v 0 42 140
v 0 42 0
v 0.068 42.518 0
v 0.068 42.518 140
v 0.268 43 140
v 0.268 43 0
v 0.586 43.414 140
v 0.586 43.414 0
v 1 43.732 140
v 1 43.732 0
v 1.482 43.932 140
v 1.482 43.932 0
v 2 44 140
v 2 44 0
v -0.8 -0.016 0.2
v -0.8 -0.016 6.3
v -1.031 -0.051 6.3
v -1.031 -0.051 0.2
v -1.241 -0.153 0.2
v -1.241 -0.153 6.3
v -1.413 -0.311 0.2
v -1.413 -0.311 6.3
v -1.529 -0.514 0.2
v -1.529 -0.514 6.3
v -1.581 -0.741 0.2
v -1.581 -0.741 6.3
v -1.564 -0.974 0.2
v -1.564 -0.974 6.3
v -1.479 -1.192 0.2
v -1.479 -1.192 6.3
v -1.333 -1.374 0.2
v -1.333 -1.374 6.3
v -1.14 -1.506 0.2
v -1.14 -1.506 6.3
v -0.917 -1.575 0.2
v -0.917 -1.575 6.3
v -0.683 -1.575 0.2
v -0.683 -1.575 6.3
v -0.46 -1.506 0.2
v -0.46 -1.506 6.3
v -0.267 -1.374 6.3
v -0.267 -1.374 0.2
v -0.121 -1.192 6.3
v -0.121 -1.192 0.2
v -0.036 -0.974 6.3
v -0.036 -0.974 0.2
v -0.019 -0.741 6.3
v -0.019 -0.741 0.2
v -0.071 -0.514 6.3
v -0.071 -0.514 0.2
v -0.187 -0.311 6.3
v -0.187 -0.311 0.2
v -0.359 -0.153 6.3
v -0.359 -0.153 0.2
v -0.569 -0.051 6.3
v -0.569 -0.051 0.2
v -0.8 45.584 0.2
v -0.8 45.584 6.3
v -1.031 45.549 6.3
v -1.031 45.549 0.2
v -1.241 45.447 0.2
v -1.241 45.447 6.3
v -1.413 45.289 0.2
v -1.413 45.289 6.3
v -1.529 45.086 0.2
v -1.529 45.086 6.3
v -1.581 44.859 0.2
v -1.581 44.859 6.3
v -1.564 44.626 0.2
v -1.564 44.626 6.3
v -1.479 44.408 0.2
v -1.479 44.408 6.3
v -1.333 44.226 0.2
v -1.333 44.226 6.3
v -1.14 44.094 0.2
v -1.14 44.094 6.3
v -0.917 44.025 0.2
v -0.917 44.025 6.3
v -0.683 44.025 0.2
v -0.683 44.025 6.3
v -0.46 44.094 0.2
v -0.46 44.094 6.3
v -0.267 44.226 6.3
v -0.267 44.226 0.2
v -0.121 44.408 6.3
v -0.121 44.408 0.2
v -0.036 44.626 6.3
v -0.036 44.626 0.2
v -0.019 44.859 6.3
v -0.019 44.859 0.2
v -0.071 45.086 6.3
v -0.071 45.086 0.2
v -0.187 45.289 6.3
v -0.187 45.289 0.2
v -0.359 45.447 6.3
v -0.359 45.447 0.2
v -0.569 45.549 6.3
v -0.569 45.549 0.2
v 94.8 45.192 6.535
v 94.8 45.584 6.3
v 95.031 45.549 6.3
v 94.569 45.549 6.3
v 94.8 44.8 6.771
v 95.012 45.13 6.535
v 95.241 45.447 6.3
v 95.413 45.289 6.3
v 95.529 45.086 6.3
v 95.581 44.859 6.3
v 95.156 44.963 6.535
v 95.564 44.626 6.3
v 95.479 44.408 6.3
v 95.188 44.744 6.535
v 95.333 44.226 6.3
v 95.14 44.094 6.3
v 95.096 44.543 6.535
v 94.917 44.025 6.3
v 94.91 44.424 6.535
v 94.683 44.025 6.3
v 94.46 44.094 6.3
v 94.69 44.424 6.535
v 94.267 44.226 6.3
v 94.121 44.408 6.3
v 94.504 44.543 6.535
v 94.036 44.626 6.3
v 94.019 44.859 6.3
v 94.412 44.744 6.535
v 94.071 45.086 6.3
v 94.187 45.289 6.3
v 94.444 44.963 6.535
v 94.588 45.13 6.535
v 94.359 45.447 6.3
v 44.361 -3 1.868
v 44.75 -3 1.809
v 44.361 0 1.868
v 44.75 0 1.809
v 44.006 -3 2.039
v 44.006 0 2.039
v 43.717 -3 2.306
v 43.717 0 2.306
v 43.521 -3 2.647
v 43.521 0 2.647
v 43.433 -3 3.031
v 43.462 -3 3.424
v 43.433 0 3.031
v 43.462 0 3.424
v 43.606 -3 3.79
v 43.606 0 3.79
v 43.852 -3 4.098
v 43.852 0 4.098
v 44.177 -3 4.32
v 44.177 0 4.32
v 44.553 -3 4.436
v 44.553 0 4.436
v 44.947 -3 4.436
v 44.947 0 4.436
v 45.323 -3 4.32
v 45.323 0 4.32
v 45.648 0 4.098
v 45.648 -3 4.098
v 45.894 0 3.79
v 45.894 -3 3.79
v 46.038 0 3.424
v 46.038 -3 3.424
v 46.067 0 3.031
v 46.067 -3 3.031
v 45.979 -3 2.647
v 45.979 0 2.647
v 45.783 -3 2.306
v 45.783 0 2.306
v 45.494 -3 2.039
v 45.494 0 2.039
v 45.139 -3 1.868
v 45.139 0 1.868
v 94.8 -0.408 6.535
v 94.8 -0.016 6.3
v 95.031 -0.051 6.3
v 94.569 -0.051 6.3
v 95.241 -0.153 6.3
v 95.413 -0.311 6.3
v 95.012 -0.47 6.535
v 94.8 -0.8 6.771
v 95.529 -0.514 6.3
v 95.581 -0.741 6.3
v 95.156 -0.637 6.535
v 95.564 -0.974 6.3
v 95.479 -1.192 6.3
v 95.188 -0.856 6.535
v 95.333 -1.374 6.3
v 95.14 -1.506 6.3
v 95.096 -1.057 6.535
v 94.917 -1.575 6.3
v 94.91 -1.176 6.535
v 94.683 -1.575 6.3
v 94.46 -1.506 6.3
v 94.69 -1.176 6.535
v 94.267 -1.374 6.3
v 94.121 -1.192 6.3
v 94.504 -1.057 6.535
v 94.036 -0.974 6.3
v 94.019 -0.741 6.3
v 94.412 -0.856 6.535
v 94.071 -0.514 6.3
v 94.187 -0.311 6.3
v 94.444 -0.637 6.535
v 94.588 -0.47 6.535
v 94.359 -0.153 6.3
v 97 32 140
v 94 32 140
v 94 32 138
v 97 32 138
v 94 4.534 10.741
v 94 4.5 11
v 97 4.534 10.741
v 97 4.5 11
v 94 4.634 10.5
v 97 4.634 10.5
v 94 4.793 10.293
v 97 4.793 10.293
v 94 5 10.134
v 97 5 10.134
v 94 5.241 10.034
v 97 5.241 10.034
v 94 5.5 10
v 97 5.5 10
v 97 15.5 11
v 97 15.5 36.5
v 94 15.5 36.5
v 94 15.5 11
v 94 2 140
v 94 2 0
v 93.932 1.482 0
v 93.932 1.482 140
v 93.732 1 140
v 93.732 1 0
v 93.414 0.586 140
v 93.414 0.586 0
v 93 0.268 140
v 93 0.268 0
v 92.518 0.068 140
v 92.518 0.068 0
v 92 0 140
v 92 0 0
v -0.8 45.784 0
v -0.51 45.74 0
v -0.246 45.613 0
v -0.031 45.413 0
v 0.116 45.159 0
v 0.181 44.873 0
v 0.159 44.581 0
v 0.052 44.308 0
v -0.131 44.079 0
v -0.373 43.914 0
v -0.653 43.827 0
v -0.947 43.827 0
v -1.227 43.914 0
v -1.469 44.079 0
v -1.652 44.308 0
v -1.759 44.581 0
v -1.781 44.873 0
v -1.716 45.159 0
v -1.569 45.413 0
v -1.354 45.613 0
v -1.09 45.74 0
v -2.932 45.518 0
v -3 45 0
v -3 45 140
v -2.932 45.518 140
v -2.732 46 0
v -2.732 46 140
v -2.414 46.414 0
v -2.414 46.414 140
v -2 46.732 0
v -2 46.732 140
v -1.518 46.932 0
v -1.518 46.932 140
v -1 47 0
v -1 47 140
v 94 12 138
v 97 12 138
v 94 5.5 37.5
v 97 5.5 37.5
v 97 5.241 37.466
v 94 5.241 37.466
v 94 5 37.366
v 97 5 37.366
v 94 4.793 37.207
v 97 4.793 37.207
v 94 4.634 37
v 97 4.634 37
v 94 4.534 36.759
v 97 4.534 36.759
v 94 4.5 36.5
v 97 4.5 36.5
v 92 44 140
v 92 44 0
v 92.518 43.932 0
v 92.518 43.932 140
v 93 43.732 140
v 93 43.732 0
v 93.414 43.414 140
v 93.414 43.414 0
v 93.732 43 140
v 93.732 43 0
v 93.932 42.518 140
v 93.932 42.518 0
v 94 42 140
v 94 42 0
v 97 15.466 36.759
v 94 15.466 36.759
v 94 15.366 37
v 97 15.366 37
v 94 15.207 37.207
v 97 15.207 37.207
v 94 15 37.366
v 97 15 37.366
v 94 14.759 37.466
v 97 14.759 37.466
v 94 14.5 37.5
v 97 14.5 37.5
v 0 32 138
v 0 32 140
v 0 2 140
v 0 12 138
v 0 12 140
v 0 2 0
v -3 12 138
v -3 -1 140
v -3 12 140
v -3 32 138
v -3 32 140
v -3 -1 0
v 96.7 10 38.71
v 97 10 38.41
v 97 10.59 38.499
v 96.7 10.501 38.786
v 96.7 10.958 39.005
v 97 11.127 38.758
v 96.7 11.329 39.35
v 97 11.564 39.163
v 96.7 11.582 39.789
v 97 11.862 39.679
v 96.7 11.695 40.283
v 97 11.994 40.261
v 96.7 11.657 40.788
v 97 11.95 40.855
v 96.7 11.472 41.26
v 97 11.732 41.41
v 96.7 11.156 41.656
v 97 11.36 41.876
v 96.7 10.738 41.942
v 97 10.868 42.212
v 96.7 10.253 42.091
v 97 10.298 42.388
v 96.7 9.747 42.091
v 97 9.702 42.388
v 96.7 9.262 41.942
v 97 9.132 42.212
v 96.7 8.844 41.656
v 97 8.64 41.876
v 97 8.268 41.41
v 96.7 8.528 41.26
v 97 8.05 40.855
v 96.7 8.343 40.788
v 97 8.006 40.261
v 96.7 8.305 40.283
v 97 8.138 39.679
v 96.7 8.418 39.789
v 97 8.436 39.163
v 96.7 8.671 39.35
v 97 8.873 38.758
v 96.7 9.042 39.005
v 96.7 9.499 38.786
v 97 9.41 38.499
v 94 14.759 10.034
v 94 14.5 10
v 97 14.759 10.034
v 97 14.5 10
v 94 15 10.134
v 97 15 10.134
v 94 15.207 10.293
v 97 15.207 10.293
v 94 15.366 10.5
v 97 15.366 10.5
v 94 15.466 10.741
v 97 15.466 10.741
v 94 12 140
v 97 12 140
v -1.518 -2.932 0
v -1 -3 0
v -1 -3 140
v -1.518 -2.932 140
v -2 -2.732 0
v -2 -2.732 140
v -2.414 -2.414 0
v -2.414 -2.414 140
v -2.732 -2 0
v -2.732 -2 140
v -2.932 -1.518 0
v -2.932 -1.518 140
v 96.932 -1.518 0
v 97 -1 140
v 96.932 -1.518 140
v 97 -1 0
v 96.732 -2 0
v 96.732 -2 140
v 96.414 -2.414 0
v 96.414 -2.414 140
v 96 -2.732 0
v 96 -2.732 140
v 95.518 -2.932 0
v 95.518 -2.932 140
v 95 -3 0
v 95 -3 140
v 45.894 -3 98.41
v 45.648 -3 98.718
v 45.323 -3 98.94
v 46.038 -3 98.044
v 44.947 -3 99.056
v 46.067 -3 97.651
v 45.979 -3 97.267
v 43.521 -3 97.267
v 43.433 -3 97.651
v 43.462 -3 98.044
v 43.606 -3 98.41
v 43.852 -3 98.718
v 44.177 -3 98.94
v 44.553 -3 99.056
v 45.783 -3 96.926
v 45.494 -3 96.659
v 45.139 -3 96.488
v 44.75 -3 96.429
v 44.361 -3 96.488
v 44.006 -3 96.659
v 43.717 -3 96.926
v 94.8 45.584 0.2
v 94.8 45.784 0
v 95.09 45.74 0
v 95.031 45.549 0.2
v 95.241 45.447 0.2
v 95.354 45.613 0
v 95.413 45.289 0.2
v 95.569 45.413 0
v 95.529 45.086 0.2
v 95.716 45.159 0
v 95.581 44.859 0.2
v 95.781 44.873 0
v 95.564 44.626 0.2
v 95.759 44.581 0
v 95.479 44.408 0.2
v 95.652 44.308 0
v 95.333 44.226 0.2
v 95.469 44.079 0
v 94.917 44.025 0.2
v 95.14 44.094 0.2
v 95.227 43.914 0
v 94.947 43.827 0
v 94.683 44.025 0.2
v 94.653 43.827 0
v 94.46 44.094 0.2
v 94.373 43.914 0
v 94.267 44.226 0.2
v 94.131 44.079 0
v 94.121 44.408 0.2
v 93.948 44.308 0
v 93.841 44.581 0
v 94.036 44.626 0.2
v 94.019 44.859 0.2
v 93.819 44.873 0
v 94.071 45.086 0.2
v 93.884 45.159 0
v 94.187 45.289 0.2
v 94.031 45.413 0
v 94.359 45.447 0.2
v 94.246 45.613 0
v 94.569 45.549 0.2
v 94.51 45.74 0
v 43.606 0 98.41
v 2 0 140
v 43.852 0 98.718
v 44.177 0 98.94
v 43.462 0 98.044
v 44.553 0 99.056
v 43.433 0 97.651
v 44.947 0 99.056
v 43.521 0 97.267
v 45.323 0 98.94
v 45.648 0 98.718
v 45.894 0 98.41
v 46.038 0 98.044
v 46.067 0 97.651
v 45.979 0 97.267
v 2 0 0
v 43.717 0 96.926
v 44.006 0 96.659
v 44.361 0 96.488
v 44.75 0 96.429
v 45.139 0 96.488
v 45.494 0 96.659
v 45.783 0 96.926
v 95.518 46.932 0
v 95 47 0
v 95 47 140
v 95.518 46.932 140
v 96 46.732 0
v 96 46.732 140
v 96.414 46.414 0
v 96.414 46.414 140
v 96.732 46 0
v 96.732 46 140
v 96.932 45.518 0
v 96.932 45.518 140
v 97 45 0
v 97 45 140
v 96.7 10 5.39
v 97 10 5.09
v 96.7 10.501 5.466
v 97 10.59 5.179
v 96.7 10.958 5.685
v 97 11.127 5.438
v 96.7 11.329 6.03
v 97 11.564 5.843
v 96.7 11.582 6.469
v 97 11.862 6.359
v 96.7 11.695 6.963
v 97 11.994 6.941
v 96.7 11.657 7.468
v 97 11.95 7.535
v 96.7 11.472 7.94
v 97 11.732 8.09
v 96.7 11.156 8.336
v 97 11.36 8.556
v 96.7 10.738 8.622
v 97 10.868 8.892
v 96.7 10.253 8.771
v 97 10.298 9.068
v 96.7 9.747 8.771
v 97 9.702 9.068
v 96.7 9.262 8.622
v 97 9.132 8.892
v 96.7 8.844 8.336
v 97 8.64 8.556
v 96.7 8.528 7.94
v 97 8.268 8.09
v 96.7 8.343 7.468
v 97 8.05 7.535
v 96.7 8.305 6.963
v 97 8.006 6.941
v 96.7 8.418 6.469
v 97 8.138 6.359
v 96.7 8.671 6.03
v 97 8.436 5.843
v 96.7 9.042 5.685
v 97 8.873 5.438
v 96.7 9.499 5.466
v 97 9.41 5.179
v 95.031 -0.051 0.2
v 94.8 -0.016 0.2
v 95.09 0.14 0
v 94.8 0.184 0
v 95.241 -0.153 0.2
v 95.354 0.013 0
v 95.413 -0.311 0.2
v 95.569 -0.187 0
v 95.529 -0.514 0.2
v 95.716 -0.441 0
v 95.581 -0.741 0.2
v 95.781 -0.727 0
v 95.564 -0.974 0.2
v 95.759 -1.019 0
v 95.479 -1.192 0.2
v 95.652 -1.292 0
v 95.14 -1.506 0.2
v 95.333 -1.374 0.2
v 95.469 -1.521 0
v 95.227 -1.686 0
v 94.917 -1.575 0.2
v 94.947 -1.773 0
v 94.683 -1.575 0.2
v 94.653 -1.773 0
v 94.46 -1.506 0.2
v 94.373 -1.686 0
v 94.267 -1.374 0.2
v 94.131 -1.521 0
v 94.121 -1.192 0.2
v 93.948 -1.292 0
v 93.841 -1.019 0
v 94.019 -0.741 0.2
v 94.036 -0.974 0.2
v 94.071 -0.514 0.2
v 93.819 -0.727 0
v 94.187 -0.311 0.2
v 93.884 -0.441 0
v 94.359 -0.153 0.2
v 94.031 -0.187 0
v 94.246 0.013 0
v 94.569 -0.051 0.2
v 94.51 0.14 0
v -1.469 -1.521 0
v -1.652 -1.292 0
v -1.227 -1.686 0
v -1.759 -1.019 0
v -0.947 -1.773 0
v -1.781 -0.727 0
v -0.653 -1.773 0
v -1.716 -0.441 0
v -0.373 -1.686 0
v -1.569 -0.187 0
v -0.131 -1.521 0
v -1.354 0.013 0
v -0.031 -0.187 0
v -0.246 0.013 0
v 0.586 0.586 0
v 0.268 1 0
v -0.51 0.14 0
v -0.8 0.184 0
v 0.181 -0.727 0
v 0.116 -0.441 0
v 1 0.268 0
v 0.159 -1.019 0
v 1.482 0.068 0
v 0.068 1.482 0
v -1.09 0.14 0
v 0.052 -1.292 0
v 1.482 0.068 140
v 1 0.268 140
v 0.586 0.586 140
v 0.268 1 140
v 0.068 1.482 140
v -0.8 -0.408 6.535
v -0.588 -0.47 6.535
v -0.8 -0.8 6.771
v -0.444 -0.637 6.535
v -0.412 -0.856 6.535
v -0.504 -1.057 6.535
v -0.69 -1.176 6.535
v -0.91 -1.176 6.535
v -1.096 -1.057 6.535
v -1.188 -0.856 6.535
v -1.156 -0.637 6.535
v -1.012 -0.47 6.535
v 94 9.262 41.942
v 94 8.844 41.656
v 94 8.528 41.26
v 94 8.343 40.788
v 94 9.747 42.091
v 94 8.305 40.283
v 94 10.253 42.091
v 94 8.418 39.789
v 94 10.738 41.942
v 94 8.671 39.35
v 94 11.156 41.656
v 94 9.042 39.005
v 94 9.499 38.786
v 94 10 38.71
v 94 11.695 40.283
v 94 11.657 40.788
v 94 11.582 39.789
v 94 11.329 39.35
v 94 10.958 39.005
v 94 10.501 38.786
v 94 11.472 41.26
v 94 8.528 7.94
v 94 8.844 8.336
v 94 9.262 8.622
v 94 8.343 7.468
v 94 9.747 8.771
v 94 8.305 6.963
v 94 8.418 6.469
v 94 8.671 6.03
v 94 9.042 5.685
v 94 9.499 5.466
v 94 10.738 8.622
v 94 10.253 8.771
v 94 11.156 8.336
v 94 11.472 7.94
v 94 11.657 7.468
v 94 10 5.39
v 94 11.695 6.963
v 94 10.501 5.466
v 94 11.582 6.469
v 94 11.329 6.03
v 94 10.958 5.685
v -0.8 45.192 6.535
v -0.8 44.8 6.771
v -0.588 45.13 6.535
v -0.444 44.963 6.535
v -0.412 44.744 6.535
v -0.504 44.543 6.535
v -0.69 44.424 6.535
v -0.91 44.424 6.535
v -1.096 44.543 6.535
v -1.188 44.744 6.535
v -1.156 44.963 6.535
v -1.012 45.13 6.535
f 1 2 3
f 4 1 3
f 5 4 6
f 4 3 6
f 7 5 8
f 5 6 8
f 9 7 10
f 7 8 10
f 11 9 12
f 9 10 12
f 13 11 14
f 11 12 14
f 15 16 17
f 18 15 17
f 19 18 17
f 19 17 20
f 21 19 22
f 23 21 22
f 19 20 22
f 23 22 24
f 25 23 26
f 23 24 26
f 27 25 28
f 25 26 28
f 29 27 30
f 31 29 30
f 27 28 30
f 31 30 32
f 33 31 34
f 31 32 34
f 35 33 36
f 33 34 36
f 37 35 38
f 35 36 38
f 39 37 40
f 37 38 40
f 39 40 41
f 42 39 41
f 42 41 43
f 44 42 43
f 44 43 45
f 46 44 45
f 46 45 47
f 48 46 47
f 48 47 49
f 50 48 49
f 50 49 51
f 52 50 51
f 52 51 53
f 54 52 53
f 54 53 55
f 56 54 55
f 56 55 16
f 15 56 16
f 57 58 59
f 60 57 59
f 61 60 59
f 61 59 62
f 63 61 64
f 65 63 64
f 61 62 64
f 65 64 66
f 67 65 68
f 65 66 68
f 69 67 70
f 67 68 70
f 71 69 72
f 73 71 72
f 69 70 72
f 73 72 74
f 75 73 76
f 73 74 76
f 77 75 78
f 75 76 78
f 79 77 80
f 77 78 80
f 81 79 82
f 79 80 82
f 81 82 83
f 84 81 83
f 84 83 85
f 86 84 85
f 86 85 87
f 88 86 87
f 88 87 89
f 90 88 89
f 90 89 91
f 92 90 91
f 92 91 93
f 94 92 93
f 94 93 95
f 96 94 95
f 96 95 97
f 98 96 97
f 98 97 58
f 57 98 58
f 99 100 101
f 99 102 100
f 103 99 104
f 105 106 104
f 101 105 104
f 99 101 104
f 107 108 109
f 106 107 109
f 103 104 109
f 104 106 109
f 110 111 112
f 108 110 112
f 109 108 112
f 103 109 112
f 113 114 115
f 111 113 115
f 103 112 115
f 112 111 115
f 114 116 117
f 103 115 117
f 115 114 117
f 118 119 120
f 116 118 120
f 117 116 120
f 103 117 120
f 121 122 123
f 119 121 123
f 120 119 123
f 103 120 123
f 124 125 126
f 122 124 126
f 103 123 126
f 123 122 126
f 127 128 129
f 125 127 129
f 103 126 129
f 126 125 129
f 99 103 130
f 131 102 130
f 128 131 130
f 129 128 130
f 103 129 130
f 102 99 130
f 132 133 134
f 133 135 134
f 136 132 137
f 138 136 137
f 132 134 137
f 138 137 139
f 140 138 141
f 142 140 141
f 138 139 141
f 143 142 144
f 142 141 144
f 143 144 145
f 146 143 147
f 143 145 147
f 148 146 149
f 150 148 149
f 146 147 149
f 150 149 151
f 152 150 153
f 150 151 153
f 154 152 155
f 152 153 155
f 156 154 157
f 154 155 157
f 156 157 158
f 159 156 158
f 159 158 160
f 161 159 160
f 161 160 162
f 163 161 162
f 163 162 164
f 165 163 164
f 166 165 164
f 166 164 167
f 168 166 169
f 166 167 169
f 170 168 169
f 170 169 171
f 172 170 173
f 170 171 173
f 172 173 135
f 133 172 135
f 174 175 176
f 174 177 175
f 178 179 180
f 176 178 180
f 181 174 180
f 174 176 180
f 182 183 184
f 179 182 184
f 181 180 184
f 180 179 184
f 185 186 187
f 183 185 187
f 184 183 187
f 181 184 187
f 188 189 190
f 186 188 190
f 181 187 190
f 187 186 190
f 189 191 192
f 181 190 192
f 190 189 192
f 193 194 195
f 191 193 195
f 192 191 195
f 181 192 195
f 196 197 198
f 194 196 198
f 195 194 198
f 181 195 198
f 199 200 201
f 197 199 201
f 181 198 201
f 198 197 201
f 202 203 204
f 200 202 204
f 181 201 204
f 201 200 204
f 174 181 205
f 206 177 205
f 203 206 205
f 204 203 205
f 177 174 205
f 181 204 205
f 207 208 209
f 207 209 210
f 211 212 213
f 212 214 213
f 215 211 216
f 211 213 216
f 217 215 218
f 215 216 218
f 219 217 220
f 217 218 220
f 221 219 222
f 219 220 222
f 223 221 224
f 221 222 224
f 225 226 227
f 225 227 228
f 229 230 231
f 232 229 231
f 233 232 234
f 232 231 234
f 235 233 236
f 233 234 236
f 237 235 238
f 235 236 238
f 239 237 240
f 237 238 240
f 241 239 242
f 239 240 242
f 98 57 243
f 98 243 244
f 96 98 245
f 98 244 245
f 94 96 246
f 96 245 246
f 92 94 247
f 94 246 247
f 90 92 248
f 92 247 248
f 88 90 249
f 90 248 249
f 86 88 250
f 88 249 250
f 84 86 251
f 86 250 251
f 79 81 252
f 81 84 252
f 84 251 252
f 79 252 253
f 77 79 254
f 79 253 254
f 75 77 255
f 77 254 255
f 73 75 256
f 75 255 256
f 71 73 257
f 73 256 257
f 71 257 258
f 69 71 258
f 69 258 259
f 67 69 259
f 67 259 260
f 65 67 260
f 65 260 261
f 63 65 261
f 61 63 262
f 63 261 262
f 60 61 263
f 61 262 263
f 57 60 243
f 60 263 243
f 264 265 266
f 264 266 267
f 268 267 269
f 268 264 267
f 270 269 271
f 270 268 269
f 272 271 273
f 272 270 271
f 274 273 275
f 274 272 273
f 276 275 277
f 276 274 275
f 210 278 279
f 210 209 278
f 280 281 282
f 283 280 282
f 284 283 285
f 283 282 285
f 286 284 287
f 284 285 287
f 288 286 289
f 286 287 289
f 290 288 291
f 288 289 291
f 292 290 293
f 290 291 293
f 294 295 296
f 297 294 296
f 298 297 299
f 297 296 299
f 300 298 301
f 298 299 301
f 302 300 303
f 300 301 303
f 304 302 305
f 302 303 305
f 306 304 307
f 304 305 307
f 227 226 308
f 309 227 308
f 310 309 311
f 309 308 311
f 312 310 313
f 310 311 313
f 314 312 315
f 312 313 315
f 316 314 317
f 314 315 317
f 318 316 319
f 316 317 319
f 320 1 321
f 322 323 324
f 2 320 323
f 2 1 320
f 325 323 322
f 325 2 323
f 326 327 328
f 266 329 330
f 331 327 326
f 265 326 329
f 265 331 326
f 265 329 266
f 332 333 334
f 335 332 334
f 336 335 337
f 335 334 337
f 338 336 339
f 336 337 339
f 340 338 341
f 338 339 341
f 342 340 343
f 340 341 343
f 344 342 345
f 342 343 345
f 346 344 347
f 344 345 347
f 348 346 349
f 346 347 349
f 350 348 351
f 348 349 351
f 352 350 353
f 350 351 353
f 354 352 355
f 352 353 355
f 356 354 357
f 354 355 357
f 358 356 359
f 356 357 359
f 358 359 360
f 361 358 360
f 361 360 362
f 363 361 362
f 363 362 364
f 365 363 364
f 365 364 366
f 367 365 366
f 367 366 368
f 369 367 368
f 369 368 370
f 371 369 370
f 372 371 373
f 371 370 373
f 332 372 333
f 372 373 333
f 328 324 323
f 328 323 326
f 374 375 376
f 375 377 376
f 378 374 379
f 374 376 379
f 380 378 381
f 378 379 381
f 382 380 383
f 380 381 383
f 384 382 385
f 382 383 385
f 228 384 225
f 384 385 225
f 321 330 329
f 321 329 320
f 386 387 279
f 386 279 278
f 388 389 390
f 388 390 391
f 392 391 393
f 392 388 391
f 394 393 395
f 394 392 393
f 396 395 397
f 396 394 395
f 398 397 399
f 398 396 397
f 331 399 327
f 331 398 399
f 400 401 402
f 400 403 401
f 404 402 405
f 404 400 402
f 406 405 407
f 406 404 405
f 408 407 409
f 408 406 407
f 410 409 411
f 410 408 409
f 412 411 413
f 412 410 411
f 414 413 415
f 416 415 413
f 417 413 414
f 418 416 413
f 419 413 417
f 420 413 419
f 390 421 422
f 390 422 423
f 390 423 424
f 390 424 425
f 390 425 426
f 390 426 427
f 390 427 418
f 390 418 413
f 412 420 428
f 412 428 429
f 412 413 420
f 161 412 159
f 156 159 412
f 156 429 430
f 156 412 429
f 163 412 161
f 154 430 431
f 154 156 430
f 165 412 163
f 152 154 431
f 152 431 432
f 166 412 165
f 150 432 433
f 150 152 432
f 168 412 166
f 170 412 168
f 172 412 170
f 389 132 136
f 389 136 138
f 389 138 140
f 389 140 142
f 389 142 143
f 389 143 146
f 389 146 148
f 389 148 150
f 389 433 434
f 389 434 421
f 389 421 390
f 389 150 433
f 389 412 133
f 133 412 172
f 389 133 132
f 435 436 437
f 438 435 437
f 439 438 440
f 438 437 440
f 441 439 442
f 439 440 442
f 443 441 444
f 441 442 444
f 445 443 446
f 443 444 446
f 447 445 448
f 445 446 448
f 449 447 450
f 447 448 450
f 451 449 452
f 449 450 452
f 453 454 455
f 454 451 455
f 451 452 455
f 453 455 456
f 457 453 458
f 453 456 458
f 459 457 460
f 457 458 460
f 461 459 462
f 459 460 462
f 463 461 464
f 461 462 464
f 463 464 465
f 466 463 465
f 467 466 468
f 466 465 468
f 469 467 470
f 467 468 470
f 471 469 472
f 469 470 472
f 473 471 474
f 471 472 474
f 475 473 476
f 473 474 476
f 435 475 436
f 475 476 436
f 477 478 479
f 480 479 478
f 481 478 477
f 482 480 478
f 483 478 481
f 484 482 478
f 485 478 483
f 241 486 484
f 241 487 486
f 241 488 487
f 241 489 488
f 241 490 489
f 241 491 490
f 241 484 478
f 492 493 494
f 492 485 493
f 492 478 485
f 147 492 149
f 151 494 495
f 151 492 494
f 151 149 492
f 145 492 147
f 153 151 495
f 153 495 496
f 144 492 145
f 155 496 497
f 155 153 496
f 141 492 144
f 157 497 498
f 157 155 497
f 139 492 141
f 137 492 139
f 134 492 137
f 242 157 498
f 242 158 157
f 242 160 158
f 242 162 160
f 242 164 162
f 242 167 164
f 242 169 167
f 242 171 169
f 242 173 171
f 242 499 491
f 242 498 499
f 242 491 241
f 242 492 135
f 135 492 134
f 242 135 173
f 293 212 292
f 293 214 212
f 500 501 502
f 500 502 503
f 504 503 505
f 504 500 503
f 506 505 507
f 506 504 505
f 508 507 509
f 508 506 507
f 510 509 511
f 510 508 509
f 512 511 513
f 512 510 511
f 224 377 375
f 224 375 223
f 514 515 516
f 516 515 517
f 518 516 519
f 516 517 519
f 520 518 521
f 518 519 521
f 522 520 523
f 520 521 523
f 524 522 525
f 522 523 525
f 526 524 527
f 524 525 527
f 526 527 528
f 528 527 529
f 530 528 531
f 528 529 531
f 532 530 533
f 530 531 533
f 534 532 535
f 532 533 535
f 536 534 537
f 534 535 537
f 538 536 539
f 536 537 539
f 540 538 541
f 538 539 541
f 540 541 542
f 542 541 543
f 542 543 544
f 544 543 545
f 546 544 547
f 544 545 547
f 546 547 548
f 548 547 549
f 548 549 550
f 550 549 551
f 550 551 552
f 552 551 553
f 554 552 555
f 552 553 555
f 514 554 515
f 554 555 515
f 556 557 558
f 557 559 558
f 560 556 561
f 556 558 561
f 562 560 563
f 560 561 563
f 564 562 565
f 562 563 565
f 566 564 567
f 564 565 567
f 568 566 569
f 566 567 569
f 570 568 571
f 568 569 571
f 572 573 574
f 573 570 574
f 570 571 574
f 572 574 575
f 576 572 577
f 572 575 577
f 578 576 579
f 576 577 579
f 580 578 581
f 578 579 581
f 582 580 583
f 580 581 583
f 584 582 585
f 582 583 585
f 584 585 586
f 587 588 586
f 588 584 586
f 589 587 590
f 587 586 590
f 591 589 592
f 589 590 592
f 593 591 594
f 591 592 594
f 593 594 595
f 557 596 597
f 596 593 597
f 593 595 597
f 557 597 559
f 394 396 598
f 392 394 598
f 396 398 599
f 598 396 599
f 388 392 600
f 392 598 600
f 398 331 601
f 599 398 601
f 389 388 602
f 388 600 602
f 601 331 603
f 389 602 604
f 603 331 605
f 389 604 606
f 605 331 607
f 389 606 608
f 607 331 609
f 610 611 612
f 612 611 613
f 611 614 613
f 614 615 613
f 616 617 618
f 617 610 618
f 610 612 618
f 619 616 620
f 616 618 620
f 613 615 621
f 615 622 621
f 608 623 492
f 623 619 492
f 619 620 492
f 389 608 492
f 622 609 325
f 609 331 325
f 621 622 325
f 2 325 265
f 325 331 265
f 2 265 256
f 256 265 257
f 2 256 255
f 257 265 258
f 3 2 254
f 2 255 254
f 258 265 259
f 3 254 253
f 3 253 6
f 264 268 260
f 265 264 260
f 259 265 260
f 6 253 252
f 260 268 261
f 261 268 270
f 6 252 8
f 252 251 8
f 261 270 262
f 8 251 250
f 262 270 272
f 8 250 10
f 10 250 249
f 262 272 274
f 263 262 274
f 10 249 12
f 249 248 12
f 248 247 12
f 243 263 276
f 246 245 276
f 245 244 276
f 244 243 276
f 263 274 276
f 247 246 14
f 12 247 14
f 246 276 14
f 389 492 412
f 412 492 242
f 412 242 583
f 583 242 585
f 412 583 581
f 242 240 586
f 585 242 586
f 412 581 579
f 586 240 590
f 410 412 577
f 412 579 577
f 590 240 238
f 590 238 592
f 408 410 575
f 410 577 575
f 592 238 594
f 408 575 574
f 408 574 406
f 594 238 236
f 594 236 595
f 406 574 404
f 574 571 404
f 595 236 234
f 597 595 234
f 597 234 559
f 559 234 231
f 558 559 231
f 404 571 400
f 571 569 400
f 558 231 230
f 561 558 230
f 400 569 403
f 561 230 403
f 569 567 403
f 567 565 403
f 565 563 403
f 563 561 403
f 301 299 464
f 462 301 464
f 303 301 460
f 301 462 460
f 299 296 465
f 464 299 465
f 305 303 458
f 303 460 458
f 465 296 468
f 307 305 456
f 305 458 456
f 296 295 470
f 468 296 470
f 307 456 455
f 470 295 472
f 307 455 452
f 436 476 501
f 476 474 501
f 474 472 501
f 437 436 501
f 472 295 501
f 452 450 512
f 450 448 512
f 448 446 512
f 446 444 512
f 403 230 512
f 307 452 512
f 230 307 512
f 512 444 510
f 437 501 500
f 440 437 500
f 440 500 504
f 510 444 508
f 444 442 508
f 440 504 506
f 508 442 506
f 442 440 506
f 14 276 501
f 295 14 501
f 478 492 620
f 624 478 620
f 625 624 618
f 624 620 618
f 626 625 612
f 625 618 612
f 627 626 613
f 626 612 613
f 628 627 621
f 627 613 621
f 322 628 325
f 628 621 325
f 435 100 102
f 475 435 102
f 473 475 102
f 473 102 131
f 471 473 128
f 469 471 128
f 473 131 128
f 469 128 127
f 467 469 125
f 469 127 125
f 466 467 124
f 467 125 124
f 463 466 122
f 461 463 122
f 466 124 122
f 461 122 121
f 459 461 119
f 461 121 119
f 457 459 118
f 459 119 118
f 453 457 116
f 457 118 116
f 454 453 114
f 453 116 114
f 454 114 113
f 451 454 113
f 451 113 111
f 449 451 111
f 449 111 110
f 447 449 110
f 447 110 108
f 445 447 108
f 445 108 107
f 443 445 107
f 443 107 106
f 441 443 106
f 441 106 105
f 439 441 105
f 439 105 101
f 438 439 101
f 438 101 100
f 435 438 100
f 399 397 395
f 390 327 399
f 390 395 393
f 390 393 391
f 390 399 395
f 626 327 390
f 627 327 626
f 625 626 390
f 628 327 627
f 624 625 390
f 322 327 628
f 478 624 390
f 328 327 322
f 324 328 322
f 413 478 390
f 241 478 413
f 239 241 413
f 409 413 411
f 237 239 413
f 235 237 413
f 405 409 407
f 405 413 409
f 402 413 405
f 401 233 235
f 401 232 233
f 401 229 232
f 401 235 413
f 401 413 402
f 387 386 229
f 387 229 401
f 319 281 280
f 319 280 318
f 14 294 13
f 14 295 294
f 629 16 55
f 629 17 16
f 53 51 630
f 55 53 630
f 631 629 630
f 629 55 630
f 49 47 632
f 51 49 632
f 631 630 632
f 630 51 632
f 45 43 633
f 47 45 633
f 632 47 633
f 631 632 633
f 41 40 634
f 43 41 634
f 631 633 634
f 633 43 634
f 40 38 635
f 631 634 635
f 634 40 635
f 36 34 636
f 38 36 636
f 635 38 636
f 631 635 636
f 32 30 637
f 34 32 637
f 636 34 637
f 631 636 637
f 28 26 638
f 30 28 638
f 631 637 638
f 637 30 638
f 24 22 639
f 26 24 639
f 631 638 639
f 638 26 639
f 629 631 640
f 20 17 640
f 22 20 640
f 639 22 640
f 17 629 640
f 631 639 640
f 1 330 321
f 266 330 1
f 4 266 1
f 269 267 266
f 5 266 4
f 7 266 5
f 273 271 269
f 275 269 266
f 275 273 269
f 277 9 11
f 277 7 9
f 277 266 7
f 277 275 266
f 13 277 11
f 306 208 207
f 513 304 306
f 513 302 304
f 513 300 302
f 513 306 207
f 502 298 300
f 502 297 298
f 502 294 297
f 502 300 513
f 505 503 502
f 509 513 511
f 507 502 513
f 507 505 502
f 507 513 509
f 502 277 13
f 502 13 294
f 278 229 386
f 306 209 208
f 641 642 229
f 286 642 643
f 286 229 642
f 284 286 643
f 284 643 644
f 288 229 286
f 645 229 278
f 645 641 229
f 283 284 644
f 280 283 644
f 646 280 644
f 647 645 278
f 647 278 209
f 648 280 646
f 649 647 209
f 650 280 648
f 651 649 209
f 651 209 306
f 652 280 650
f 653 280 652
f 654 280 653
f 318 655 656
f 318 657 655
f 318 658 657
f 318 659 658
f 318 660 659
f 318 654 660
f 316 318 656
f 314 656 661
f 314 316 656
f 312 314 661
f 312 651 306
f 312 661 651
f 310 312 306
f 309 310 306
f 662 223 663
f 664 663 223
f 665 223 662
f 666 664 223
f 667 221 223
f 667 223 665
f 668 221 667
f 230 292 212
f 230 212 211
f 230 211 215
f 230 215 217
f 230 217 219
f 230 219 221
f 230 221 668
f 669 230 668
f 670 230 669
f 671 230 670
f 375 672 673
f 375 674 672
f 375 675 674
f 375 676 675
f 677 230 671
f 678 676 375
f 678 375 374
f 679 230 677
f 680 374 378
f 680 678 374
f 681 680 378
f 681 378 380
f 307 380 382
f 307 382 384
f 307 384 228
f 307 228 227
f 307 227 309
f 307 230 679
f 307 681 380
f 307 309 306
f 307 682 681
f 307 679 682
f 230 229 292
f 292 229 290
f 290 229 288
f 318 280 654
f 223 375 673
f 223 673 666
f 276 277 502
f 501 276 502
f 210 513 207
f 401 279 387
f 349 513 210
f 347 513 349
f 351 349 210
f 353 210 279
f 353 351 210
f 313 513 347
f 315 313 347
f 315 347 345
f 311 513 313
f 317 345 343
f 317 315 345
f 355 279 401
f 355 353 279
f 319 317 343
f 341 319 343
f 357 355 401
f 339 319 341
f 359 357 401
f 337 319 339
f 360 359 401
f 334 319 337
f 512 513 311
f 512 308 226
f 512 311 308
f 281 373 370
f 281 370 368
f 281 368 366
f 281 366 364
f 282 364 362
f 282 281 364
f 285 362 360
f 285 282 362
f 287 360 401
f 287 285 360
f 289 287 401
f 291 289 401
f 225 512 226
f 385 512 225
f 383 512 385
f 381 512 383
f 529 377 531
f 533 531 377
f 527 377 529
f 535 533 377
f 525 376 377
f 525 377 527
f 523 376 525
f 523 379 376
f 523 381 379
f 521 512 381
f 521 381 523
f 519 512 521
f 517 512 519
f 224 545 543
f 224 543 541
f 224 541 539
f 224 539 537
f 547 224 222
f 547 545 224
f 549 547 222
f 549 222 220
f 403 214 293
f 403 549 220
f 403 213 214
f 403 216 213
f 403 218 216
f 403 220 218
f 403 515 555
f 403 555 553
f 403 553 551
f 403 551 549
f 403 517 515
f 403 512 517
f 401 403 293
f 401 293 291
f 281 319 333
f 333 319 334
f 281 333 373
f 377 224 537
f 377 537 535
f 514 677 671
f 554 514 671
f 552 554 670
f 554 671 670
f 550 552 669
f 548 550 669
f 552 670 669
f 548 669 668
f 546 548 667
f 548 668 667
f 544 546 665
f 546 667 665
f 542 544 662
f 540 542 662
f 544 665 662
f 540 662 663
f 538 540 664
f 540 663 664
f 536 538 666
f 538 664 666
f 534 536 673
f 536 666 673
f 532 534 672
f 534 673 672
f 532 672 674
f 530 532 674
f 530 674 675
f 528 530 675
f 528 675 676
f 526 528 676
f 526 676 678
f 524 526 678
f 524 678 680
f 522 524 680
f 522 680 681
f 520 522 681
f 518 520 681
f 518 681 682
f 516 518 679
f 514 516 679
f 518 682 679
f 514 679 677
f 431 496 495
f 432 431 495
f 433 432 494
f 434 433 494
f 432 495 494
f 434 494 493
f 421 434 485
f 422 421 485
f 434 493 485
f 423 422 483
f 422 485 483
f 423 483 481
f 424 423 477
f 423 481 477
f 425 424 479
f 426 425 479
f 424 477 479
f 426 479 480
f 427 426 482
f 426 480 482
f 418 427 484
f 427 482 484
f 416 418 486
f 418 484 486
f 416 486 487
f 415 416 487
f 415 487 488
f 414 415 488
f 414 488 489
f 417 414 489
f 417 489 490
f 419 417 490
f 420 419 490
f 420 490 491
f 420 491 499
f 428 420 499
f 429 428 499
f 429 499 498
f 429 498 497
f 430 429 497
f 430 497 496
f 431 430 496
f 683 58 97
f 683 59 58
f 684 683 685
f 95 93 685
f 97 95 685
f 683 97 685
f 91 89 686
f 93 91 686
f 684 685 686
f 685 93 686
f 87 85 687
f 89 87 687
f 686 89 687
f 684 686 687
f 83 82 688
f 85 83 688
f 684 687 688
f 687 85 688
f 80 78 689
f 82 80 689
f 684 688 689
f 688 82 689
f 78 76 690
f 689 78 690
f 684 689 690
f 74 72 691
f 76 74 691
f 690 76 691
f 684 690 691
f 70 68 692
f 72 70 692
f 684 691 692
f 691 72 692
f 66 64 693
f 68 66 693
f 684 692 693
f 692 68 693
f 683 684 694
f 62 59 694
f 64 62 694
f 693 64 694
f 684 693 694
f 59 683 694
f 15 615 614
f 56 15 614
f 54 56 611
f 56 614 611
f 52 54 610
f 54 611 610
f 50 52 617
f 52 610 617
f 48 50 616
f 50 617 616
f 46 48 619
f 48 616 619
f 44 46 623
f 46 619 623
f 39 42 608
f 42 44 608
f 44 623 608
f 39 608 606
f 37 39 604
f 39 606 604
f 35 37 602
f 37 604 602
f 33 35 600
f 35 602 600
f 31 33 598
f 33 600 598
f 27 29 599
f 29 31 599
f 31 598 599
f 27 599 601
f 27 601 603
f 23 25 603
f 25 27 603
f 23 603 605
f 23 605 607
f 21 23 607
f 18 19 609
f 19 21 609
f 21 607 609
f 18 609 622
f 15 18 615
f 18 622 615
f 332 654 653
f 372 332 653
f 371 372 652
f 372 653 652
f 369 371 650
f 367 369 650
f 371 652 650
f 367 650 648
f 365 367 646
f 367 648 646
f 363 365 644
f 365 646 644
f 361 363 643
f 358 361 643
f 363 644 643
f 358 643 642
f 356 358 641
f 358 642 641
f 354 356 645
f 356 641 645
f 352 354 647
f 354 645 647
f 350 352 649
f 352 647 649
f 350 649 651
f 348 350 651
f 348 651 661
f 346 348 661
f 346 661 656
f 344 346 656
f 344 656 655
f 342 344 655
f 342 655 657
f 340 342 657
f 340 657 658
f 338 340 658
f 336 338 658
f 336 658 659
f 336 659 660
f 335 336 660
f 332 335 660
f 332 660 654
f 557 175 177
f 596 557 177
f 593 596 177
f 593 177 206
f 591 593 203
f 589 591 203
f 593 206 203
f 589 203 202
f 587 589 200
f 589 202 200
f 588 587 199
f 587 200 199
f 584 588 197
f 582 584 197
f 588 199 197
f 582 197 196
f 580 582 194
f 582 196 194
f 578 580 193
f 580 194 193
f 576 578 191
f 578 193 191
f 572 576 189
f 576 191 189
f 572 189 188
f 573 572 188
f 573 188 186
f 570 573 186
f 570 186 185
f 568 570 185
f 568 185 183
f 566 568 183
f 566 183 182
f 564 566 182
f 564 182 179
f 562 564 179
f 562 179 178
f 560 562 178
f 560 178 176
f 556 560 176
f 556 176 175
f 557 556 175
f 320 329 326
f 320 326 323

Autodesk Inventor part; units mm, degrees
ref_plane "YZ Plane" through (0, 0, 0) normal (1, 0, 0) x (0, 1, 0)
ref_plane "XZ Plane" through (0, 0, 0) normal (0, 1, 0) x (-1, 0, 0)
ref_plane "XY Plane" through (0, 0, 0) normal (0, 0, 1) x (1, 0, 0)
sketch "Sketch1" plane through (0, 0, 0) normal (0, 0, 1) x (1, 0, 0)
  line L0 (2, 0) -> (92, 0)
  line L1 (94, 2) -> (94, 42)
  line L2 (92, 44) -> (2, 44)
  line L3 (0, 42) -> (0, 2)
  line L4 (-1, 47) -> (95, 47)
  line L5 (97, 45) -> (97, -1)
  line L6 (95, -3) -> (-1, -3)
  line L7 (-3, -1) -> (-3, 45)
  arc A0 (2, 44) -> (0, 42) centre (2, 42) ccw
  arc A1 (0, 2) -> (2, 0) centre (2, 2) ccw
  arc A2 (92, 0) -> (94, 2) centre (92, 2) ccw
  arc A3 (94, 42) -> (92, 44) centre (92, 42) ccw
  arc A4 (-3, -1) -> (-1, -3) centre (-1, -1) ccw
  arc A5 (-1, 47) -> (-3, 45) centre (-1, 45) ccw
  arc A6 (97, 45) -> (95, 47) centre (95, 45) ccw
  arc A7 (95, -3) -> (97, -1) centre (95, -1) ccw
  point P0 (0, 0)
  point P1 (94, 44)
  point P2 (94, 0)
  point P3 (0, 44)
  point P4 (97, -3)
  point P5 (97, 47)
  point P6 (-3, -3)
  dimension "d0" = 94
  dimension "d1" = 44
  dimension "d2" = 100
  dimension "d3" = 50
  dimension "d4" = 3
  dimension "d5" = 3
  dimension "d6" = 2
  dimension "d9" = 2
extrude "Extrusion1" add sketch "Sketch1" along normal blind 140
sketch "Sketch2" plane through (0, 0, 140) normal (0, 0, 1) x (1, 0, 0)
  line L0 (-3, 45) -> (-3, -1) projected
  line L1 (97, -1) -> (97, 45) projected
  line L2 (-3, 32) -> (97, 32)
  line L3 (97, 32) -> (97, 12)
  line L4 (97, 12) -> (-3, 12)
  line L5 (-3, 12) -> (-3, 32)
  line L6 (-1, -3) -> (95, -3) projected
  line L7 (95, 47) -> (-1, 47) projected
  point P0 (0, 0)
  point P1 (-3, 12)
  dimension "d10" = 20
  dimension "d11" = 15
  dimension "d12" = 50
extrude "Extrusion2" cut sketch "Sketch2" against normal blind 2
sketch "Sketch3" plane through (97, -1, 0) normal (1, 0, 0) x (0, 0, -1)
  line L0 (-11, 5.5) -> (-36.5, 5.5)
  line L1 (-37.5, 6.5) -> (-37.5, 15.5)
  line L2 (-36.5, 16.5) -> (-11, 16.5)
  line L3 (-10, 15.5) -> (-10, 6.5)
  line L4 (0, -2) -> (-140, -2) projected
  line L5 (0, 48) -> (-140, 48) projected
  line L6 (0, 0) -> (0, 46) projected
  arc A0 (-11, 5.5) -> (-10, 6.5) centre (-11, 6.5) ccw
  arc A1 (-10, 15.5) -> (-11, 16.5) centre (-11, 15.5) ccw
  arc A2 (-37.5, 6.5) -> (-36.5, 5.5) centre (-36.5, 6.5) ccw
  arc A3 (-36.5, 16.5) -> (-37.5, 15.5) centre (-36.5, 15.5) ccw
  circle A4 centre (-7.09, 11) radius 1.5
  circle A5 centre (-40.41, 11) radius 1.5
  line L7 (-23.75, 5.5) -> (-23.75, 19.7829) construction
  point P0 (0, 1)
  point P1 (-37.5, 16.5)
  point P2 (-37.5, 5.5)
  point P3 (-10, 16.5)
  dimension "d15" = 27.5
  dimension "d16" = 11
  dimension "d17" = 50
  dimension "d18" = 31.5
  dimension "d19" = 10
  dimension "d20" = 1
  dimension "d21" = 3
  dimension "d22" = 3
  dimension "d23" = 16.66
  dimension "d24" = 16.66
extrude "Extrusion3" cut sketch "Sketch3" against normal blind 10 contours L0 A2 L1 A3 L2 A1 L3 A0
hole "Hole1" at (97, 10, 7.09) at (97, 10, 40.41) direction (-1, 0, 0) diameter 3.4 depth 8.8 tip angle 118 clearance for "Countersunk Flat Head Screw ISO 2009/7046" size "M3" standard "ISO"
chamfer "Chamfer1" distance 0.3 angle 45 2 edges at (97, 10, 8.79) (97, 10, 42.11)
sketch "Sketch5" plane through (-1, -3, 0) normal (0, -1, 0) x (1, 0, 0)
  circle A0 centre (45.75, 3.13) radius 1.5
  circle A1 centre (45.75, 97.75) radius 1.5
  line L0 (98, 0) -> (98, 140) projected
  line L1 (0, 0) -> (96, 0) projected
  point P0 (1, 0)
  dimension "d49" = 3
  dimension "d50" = 3
  dimension "d51" = 94.62
  dimension "d52" = 52.25
  dimension "d53" = 3.13
hole "Hole3" at (44.75, -3, 3.13) at (44.75, -3, 97.75) direction (0, 1, 0) diameter 2.6416 depth 10.979 tip angle 118 thread size "6-32 UNC" class "2B" standard "ANSI Unified Screw Threads"
sketch "Sketch6" plane through (0, 0, 0) normal (0, 0, -1) x (-1, 0, 0)
  circle A0 centre (0.8, -0.8) radius 1
  line L0 (1, -3) -> (-95, -3) construction
  line L1 (-47, -3) -> (-47, -11.0585) construction
  line L2 (3, 45) -> (3, -1) construction
  line L3 (3, 22) -> (17.9543, 22) construction
  circle A1 centre (0.8, 44.8) radius 1
  line L4 (-47, 47) -> (-47, 55.0585) construction
  circle A2 centre (-94.8, -0.8) radius 1
  circle A3 centre (-94.8, 44.8) radius 1
  point P0 (0, 0)
  point P1 (-94, 0)
  point P2 (-97, 45)
  point P3 (-97, -1)
  dimension "d61" = 2
  dimension "d62" = 2.2
  dimension "d63" = 2.2
hole "Hole4" at (-0.8, -0.8, 0) at (-0.8, 44.8, 0) at (94.8, 44.8, 0) at (94.8, -0.8, 0) direction (0, 0, 1) diameter 1.567 depth 6.3 tip angle 118 thread size "M2x0.4" class "6H" standard "ISO Metric profile"
chamfer "Chamfer2" distance 0.2 angle 45 4 edges at (-0.8, -1.5835, 0) (-0.8, 44.0165, 0) (94.8, 44.0165, 0) (94.8, -1.5835, 0)
equation "\"d24\" = d23"
properties part number "obudowa"
